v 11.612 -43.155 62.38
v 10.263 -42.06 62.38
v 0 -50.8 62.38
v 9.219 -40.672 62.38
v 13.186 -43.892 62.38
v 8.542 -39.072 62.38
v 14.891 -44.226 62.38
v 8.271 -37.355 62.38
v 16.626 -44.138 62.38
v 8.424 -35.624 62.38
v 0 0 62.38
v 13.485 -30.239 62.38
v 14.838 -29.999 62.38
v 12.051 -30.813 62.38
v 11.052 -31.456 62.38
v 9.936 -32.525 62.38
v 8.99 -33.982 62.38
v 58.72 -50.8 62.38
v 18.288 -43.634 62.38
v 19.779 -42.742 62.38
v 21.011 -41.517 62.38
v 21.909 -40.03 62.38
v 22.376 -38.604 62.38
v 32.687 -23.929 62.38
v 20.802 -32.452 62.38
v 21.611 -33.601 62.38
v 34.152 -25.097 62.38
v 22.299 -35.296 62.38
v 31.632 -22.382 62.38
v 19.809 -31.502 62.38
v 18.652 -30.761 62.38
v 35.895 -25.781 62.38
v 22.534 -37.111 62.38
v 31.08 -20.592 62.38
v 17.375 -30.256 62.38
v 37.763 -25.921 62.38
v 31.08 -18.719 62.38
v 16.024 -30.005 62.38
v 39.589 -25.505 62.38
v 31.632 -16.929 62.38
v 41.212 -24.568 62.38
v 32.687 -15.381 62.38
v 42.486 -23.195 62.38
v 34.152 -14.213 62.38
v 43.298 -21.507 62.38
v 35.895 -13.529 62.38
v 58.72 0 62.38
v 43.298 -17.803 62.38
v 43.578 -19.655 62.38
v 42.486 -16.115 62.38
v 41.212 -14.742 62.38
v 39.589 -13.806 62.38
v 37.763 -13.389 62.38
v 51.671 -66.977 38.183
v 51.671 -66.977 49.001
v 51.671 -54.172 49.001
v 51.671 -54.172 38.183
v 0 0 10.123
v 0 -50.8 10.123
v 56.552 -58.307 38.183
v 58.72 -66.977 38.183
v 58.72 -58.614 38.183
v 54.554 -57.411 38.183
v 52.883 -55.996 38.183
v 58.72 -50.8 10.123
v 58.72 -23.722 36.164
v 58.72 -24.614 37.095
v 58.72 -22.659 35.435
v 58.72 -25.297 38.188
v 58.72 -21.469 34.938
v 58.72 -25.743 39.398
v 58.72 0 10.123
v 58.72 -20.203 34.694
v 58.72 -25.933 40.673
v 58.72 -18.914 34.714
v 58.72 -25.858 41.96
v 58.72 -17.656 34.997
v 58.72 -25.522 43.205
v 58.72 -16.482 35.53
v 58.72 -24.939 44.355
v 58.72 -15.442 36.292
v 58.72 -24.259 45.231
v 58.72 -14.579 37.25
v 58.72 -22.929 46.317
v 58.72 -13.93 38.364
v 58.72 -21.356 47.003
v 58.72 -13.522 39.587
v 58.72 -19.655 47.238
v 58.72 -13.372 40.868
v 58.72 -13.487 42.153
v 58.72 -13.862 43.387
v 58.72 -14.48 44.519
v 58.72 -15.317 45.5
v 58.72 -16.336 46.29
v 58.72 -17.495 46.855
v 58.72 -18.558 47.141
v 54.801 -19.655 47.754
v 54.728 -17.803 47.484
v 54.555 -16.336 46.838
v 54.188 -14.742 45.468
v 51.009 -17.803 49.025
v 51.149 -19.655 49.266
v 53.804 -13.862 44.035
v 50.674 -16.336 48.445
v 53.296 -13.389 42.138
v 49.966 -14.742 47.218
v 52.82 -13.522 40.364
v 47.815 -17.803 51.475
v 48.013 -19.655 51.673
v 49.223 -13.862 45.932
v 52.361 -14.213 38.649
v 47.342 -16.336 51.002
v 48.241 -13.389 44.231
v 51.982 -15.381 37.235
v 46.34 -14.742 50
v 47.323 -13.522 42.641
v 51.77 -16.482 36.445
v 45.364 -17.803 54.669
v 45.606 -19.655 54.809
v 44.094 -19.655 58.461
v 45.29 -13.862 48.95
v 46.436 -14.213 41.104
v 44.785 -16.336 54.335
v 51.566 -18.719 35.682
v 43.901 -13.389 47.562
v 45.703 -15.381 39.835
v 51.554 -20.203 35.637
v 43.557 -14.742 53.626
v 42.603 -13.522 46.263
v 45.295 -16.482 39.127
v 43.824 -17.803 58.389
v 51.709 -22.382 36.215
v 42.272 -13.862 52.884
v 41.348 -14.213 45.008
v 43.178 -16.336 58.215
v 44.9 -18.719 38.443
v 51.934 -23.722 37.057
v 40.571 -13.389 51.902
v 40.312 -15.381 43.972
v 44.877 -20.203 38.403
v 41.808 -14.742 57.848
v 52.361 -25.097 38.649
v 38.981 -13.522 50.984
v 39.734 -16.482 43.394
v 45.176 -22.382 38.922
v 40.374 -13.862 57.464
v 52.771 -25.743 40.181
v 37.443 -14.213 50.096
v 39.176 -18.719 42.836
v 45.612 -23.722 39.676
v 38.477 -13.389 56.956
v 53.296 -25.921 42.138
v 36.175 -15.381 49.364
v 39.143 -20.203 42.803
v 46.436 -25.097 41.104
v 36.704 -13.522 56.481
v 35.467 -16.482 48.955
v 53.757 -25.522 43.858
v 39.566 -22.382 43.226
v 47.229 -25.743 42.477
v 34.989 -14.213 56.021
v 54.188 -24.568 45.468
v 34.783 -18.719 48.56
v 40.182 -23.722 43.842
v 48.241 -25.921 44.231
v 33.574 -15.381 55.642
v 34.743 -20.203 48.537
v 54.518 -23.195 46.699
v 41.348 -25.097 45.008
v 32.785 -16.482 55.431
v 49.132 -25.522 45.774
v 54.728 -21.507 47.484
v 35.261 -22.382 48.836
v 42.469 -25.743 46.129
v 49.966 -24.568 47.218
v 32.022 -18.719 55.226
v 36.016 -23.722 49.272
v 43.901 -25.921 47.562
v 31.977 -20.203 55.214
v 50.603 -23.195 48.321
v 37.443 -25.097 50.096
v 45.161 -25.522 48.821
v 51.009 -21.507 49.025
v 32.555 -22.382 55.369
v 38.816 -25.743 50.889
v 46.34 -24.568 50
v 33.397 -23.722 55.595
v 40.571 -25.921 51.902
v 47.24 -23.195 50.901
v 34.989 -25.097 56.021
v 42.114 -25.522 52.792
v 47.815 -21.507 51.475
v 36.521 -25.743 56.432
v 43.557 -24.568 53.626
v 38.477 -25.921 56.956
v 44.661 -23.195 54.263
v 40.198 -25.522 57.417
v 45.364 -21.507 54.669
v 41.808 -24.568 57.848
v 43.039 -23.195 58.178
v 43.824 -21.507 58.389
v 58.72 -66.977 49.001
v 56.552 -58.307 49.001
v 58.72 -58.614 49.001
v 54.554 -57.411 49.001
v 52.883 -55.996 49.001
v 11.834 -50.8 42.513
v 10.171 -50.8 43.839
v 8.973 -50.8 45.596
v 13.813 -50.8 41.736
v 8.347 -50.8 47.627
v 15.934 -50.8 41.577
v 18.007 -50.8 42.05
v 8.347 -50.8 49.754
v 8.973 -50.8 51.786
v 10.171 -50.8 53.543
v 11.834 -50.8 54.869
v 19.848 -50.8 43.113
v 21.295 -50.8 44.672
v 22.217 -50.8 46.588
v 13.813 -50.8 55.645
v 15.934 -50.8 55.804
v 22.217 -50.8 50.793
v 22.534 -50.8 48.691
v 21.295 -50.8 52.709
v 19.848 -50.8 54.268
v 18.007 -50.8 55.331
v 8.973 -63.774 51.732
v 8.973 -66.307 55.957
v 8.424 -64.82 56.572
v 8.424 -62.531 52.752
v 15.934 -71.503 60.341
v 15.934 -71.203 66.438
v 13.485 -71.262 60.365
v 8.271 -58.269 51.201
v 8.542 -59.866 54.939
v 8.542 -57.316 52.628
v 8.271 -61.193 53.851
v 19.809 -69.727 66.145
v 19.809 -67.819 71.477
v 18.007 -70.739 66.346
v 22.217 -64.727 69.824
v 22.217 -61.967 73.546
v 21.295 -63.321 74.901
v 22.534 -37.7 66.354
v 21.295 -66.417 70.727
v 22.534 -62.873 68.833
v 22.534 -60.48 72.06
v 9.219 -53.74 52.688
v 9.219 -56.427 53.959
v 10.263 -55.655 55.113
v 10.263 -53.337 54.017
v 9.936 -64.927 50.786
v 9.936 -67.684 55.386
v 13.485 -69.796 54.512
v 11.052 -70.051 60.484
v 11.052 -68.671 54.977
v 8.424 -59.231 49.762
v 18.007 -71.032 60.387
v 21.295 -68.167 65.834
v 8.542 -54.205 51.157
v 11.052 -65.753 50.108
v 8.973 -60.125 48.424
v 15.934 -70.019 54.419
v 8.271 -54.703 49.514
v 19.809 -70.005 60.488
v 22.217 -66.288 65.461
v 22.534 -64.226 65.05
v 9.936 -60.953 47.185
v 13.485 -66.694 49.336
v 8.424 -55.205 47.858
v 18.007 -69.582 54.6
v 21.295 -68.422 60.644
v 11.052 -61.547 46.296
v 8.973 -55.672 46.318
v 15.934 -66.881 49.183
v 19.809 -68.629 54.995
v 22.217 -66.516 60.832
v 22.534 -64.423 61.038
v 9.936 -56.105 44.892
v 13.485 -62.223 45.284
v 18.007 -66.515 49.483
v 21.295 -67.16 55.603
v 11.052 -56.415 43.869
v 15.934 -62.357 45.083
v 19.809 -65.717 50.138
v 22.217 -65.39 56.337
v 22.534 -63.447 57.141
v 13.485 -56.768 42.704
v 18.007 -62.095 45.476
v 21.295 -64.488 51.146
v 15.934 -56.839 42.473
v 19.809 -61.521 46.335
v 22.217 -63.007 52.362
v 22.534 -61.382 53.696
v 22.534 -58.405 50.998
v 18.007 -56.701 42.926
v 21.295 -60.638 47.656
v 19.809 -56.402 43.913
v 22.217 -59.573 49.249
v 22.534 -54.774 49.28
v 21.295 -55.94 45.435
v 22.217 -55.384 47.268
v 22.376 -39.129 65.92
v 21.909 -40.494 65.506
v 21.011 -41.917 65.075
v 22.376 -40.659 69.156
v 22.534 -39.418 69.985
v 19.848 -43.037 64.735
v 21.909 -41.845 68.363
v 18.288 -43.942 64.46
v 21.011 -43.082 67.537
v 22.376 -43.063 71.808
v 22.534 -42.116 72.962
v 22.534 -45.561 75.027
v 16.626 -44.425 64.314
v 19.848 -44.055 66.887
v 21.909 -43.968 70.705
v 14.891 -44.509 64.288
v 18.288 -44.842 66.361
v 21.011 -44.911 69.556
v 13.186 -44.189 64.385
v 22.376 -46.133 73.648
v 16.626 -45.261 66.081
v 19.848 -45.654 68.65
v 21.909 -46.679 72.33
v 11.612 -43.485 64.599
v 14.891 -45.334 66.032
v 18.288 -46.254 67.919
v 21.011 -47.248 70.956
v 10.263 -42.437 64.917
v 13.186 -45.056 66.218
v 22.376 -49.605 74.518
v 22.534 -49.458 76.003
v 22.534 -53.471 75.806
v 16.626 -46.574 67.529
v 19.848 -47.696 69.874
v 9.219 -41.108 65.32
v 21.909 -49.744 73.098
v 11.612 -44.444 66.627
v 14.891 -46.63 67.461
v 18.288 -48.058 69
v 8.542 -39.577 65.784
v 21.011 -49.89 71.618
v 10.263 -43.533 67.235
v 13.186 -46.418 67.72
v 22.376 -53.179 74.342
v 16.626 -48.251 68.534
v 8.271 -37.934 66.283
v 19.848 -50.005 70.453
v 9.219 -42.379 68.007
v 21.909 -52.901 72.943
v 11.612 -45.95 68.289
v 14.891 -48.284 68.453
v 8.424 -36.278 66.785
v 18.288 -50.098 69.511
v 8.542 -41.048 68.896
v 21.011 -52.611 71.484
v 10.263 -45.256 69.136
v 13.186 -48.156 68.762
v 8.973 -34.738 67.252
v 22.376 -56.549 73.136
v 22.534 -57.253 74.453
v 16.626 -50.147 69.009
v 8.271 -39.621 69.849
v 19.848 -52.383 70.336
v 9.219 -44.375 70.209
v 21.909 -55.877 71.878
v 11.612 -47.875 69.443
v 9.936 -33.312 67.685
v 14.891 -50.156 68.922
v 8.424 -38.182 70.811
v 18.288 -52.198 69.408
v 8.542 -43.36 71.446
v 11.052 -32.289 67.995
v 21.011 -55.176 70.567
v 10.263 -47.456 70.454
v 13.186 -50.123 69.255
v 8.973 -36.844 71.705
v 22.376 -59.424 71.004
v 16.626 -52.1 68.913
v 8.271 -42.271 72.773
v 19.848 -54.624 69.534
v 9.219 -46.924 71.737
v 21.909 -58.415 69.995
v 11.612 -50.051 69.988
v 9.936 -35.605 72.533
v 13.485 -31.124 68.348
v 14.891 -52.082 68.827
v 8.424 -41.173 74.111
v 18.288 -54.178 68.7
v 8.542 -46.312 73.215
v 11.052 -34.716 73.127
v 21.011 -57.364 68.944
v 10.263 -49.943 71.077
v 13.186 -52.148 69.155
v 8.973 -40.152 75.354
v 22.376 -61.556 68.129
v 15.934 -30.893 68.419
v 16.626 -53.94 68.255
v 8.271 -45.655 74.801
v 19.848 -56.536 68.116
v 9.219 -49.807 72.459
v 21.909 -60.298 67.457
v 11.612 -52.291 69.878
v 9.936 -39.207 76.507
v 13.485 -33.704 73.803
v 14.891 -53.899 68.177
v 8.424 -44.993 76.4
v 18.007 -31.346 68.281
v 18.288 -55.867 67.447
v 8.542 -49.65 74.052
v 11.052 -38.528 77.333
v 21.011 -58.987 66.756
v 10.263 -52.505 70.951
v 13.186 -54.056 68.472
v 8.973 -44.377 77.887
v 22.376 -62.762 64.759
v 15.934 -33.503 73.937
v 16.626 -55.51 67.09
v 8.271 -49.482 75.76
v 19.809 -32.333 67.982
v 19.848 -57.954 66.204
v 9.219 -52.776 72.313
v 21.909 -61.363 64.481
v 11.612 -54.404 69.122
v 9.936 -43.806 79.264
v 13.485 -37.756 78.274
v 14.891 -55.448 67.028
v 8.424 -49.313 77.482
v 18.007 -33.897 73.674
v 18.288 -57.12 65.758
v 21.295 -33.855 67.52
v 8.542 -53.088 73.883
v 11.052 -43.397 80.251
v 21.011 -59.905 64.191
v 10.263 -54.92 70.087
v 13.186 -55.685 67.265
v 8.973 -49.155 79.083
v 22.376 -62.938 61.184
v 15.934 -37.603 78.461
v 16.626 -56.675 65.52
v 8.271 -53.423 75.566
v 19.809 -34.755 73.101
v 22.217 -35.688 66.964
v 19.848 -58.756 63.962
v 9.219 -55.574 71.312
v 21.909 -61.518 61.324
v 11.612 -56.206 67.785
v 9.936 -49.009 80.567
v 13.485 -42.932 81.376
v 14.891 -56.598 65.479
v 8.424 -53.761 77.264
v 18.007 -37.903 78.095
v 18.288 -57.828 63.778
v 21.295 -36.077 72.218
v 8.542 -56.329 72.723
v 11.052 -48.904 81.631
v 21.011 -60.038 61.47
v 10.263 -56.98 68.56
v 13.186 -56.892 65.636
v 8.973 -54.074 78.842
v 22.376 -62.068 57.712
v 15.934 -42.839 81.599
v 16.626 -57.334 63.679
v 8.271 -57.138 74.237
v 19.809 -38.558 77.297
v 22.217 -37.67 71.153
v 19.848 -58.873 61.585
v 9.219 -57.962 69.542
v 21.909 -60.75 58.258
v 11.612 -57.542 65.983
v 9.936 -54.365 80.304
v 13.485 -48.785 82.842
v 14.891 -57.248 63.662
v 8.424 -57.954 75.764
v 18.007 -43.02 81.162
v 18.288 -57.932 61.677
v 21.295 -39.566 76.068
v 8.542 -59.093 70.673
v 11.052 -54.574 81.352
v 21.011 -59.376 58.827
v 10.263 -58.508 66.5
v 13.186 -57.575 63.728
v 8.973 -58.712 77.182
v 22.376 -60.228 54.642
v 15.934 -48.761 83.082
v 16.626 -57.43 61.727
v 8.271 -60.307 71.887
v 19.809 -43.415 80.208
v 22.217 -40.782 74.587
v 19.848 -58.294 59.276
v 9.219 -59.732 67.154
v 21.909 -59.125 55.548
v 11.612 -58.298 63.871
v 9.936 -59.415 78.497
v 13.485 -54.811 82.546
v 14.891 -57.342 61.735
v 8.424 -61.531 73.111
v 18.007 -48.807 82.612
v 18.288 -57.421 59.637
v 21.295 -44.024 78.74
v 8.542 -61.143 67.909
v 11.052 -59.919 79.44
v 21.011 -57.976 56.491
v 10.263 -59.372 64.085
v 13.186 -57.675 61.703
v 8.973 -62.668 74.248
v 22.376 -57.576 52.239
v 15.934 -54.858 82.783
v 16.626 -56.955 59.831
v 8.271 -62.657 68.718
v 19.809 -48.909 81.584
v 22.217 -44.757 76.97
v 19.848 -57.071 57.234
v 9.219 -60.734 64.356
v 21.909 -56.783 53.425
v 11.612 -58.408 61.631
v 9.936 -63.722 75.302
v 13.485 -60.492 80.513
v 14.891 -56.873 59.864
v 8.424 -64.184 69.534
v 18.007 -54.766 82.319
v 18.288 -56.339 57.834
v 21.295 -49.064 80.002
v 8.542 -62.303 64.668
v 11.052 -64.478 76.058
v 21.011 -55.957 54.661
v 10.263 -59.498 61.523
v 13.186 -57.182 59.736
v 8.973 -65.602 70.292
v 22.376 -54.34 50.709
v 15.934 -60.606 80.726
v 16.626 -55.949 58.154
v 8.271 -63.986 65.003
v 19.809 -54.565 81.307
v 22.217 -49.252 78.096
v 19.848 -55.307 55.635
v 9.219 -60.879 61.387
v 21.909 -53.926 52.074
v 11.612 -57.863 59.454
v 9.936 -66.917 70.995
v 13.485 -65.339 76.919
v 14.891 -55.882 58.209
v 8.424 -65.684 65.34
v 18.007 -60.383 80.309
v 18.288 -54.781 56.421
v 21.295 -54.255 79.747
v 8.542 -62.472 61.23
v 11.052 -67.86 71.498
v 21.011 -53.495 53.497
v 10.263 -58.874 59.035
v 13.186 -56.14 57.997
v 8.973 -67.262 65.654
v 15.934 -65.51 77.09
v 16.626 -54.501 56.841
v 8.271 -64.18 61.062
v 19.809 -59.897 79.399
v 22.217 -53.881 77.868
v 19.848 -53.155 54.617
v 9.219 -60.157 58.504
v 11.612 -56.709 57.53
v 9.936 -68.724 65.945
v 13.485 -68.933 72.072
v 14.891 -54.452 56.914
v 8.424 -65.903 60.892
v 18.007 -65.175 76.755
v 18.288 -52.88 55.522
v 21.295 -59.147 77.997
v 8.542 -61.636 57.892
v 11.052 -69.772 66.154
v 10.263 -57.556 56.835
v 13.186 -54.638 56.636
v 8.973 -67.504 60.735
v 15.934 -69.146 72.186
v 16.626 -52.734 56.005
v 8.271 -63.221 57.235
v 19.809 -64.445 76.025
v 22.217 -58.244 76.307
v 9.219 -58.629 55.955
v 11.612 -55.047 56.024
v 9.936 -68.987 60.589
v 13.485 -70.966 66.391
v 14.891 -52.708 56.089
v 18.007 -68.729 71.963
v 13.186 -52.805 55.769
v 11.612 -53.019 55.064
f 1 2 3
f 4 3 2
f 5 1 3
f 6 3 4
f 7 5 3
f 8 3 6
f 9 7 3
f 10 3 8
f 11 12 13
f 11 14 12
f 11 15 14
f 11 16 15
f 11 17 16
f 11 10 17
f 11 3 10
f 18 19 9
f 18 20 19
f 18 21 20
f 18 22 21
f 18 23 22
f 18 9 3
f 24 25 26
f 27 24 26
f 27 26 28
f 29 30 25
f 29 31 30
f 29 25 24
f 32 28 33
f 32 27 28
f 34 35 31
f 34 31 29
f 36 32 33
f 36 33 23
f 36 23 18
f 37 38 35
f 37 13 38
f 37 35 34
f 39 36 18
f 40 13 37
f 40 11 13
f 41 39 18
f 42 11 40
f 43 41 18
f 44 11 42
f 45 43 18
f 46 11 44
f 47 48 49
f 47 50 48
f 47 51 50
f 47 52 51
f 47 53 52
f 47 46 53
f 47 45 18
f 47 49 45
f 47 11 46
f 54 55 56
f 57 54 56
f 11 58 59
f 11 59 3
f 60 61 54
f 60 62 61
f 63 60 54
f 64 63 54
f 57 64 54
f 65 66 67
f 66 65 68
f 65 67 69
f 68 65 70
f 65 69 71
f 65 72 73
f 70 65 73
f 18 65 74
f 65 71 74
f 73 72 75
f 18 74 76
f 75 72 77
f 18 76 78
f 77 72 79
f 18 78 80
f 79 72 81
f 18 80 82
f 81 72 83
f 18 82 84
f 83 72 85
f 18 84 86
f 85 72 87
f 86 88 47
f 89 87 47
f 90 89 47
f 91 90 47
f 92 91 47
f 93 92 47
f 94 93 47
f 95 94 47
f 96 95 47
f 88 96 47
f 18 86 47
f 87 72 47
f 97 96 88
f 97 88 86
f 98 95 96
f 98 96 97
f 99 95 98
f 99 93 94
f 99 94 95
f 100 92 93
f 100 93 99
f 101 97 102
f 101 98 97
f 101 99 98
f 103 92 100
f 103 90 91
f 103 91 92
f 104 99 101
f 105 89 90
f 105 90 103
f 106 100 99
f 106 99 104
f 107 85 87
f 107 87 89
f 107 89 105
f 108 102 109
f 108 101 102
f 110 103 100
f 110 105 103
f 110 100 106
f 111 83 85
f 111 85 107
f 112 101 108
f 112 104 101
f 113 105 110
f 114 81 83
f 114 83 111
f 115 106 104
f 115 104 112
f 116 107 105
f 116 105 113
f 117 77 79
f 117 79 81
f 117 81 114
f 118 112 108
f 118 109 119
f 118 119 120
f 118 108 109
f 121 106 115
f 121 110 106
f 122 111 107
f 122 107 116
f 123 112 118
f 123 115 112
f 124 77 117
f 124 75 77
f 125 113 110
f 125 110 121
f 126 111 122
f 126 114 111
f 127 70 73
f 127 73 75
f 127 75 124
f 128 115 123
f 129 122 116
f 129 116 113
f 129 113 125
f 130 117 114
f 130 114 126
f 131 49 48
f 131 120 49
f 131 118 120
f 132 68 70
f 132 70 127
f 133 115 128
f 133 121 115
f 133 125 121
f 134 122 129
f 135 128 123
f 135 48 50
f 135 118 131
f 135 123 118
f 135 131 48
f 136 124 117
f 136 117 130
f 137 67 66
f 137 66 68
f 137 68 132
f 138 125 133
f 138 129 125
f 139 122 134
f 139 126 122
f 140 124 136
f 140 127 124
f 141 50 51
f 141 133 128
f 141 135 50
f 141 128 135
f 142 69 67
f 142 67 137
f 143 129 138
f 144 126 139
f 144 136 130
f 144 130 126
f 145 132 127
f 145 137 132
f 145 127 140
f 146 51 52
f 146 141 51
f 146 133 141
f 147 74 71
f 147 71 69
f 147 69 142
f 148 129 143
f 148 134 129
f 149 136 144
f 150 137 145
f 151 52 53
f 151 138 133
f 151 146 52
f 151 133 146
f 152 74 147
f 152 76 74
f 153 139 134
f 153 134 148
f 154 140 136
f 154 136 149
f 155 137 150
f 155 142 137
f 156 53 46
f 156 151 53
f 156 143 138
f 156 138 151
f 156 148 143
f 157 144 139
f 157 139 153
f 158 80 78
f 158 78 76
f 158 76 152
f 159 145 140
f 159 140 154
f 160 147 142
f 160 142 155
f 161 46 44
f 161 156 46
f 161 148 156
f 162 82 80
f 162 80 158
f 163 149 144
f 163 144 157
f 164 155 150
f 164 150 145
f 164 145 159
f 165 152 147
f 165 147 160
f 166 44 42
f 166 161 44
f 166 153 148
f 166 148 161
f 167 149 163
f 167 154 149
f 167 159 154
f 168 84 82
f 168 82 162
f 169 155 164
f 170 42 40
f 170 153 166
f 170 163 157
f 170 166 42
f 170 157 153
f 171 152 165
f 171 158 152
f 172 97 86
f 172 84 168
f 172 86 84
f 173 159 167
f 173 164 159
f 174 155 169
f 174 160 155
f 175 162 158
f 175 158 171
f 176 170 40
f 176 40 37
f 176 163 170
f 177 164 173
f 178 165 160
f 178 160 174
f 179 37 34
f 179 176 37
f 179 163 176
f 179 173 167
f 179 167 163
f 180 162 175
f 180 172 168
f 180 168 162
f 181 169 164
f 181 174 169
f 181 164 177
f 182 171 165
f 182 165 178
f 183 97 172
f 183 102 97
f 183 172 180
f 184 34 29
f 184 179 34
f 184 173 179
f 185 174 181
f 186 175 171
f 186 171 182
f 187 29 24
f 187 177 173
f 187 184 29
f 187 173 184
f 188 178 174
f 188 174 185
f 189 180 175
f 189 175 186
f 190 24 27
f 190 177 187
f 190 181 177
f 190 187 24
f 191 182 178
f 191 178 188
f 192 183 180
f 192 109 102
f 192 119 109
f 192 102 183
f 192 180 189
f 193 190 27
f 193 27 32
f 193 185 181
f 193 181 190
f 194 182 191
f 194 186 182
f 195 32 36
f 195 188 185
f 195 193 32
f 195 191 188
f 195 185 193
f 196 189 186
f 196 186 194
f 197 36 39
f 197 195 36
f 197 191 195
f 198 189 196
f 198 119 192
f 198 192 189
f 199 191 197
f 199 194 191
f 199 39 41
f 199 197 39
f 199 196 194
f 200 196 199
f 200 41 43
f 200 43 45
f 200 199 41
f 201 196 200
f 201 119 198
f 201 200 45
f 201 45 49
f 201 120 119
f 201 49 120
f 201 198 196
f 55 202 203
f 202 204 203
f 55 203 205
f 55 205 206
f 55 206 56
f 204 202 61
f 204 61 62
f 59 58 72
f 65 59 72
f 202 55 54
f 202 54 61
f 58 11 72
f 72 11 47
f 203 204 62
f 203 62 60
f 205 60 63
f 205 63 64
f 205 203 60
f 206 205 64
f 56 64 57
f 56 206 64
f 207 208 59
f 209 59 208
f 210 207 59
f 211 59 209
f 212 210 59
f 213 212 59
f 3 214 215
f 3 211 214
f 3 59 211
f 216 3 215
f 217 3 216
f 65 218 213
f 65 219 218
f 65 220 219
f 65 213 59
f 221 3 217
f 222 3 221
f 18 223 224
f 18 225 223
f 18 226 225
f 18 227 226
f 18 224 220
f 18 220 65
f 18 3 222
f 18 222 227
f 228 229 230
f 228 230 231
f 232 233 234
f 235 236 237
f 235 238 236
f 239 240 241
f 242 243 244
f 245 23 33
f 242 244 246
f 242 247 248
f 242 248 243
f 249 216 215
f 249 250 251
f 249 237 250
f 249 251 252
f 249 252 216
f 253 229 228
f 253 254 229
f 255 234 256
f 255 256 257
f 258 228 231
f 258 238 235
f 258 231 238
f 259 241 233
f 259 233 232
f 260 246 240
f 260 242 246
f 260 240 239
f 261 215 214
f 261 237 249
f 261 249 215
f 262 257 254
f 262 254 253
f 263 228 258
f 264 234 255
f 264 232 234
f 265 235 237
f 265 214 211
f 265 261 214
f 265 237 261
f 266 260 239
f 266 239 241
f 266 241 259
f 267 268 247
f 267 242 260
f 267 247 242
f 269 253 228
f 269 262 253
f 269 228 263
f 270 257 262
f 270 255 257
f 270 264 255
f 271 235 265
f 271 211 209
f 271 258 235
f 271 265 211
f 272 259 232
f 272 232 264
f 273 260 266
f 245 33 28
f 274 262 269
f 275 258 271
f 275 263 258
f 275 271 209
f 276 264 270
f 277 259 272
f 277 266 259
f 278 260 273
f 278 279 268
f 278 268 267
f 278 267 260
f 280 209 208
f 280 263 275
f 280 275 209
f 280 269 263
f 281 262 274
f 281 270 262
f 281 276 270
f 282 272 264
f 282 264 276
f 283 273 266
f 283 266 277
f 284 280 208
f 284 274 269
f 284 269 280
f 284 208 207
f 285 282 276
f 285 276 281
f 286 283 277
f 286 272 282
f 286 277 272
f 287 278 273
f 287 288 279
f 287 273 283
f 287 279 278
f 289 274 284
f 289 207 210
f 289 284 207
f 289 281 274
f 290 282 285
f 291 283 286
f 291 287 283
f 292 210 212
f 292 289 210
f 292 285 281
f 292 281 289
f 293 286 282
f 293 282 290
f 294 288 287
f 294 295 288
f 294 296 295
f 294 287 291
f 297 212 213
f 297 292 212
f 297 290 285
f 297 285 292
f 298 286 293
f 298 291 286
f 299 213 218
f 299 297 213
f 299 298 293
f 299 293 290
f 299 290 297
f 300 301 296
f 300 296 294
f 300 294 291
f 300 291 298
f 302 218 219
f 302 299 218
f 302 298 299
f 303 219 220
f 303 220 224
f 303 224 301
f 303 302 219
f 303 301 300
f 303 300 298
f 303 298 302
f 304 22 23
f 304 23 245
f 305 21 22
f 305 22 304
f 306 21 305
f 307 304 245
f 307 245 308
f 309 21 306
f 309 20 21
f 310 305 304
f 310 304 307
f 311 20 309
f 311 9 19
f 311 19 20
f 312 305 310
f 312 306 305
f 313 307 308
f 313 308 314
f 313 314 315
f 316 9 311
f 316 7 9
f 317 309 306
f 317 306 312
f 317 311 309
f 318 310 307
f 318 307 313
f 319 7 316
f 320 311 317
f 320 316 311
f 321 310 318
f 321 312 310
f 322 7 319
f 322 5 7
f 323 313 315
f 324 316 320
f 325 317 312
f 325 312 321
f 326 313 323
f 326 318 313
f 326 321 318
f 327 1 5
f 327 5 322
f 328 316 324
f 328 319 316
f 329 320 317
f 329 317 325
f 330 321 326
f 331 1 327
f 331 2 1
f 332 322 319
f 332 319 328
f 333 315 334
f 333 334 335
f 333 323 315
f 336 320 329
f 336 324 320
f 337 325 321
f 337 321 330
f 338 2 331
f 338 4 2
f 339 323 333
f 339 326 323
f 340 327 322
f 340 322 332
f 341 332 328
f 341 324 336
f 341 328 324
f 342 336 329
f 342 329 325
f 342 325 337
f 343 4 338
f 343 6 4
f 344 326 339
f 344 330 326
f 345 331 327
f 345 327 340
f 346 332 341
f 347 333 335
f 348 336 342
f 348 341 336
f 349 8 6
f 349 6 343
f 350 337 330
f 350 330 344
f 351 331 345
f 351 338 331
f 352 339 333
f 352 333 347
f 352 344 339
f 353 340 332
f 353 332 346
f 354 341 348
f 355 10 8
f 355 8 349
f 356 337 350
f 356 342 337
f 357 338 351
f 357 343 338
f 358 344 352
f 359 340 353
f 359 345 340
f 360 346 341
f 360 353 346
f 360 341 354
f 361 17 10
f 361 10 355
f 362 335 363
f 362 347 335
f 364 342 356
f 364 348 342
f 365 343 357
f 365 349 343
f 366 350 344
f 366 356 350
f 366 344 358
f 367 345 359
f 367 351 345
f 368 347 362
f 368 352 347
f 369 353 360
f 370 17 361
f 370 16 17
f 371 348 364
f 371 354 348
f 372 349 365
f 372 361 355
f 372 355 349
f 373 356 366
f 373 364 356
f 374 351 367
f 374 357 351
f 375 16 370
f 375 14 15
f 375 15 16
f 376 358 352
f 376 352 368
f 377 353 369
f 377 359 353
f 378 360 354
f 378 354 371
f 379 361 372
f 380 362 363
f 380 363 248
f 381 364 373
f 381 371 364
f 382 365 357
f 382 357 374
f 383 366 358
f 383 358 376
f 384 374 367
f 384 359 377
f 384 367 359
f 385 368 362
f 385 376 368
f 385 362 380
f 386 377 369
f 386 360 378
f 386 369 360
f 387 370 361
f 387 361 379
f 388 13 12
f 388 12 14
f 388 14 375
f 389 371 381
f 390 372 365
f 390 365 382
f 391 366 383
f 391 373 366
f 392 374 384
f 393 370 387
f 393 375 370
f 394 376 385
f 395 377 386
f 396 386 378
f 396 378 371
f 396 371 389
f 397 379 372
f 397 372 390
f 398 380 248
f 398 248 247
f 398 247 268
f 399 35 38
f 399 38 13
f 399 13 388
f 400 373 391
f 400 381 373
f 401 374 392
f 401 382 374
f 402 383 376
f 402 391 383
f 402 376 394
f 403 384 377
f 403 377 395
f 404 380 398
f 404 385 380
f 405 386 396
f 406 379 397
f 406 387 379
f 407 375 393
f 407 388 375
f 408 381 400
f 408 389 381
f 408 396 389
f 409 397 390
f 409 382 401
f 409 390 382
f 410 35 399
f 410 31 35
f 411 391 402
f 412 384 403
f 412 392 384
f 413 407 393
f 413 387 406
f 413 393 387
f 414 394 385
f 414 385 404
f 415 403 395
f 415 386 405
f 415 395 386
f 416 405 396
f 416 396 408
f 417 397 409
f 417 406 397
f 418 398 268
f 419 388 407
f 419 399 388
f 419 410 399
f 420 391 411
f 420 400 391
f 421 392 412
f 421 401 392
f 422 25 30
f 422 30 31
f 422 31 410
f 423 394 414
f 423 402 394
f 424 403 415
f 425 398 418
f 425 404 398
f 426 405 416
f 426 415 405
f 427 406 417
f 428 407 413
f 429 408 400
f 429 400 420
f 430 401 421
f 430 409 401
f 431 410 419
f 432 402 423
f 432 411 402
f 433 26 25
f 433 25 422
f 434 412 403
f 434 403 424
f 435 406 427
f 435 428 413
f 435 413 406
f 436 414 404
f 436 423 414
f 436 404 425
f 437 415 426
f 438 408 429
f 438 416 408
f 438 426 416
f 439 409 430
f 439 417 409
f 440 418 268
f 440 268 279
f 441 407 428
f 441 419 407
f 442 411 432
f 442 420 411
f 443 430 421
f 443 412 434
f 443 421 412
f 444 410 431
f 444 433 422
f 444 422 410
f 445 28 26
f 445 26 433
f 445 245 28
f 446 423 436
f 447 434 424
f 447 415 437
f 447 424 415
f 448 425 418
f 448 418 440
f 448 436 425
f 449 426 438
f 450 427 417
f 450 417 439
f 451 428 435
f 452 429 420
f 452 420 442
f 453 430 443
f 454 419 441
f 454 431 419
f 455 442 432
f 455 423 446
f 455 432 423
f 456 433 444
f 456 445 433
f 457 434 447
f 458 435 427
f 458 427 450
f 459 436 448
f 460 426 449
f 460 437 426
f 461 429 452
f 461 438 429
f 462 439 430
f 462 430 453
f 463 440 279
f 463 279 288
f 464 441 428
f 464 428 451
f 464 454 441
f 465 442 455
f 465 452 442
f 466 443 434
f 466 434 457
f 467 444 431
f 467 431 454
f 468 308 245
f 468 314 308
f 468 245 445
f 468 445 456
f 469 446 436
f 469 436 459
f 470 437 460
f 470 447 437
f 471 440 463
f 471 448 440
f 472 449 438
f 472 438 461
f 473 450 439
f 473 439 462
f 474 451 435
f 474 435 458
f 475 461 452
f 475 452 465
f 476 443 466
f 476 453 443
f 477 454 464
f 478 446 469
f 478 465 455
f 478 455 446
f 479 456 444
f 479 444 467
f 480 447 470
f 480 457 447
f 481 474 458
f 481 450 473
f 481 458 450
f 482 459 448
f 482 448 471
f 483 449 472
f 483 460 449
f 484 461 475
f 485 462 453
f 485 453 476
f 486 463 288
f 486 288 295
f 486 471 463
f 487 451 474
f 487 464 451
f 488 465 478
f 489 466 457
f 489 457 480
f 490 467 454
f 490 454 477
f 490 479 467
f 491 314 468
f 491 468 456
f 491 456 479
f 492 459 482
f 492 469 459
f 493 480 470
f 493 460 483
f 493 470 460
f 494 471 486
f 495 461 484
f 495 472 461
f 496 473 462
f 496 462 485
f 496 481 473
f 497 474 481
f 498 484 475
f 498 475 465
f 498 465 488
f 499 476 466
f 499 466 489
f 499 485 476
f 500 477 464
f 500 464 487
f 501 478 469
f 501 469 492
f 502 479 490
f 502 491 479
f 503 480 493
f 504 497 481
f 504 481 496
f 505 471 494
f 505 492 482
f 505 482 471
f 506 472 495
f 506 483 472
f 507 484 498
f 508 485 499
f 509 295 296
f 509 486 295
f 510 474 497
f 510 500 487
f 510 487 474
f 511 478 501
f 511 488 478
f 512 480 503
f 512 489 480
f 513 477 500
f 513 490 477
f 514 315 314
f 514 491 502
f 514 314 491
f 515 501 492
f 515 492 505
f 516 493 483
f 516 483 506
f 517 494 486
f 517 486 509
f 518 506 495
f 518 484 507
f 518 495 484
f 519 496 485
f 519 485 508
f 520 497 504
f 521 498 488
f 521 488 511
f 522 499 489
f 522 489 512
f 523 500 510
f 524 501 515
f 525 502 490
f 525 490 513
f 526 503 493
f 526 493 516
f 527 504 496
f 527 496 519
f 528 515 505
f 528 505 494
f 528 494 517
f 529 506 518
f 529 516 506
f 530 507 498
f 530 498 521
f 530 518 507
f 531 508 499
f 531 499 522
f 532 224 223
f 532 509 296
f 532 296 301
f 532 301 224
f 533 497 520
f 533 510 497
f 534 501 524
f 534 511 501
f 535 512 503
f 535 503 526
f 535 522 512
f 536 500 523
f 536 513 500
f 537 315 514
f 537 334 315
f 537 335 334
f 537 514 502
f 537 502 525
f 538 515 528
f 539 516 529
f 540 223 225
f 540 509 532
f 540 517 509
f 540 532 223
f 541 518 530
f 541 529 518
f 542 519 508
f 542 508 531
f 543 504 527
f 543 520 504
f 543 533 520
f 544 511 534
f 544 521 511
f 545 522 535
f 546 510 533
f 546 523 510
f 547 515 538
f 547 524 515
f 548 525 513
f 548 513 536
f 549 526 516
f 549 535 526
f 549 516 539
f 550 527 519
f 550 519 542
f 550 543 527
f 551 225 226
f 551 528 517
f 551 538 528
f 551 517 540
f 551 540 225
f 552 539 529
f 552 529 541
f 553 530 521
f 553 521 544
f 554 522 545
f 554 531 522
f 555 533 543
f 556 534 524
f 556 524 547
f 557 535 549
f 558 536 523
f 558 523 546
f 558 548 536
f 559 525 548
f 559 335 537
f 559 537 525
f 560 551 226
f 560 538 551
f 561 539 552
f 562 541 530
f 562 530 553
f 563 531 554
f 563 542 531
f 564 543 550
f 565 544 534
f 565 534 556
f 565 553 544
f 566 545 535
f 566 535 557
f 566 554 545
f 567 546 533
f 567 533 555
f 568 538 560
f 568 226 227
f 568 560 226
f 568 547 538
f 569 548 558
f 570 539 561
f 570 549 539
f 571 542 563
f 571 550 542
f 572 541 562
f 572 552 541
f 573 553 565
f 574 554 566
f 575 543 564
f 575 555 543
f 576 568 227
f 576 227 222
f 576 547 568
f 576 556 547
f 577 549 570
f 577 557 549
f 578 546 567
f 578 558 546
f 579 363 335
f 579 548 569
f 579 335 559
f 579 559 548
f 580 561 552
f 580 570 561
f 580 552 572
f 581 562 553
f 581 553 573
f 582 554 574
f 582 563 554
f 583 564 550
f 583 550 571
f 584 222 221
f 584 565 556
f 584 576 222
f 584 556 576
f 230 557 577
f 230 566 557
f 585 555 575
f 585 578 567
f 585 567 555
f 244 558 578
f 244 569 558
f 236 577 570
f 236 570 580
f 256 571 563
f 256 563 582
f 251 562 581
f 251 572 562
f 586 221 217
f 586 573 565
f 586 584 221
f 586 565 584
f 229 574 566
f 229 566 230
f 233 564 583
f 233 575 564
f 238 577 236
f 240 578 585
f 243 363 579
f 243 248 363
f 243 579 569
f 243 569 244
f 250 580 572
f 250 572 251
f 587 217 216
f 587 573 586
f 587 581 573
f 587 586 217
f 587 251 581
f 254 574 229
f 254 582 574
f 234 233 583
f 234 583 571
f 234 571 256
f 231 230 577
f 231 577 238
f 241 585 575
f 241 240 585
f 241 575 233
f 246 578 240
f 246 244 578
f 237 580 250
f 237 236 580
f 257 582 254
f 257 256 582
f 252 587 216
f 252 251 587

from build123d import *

# Parameters (mm, degrees)
F0_W      = 58.7195754051
F0_H      = 52.2568076849
F1_DEPTH  = 50.8
F2_R      = 7.1335833388
F4_W      = 9.8321177065
F4_H      = 10.8174271882
F6_R      = 6.2838171935
F9_W      = 7.0489501051
F9_H      = 16.1772435407
F10_DEPTH = 12.7


with BuildPart() as f1:
    # F0 (on Front) → F1 (new body)
    with BuildSketch(Plane.XZ):
        with Locations((29.3597877026, 36.2514294684)):
            Rectangle(F0_W, F0_H)
    extrude(amount=F1_DEPTH)

    # F2 (on face) → F3 (revolve)
    with BuildSketch(Plane.XZ.offset(50.8)):
        with Locations((15.4005596414, 48.6906468868)):
            Circle(F2_R)
    revolve(axis=Axis((29.3597877026, -50.8, 62.3798333108), (1, 0, 0)))


with BuildPart() as f5:
    # F4 (on face) → F5 (revolve)
    with BuildSketch(Plane.XZ.offset(50.8)):
        with Locations((45.989362523, 43.5920413584)):
            Rectangle(F4_W, F4_H)
    revolve(axis=Axis((58.7195754051, -50.8, 36.2514294684), (0, 0, -1)))


with BuildPart() as f7:
    # F6 (on face) → F7 (revolve)
    with BuildSketch(Plane.XY.offset(62.3798333108)):
        with Locations((37.2937507927, -19.6551214904)):
            Circle(F6_R)
    revolve(axis=Axis((58.7195754051, -25.4, 62.3798333108), (0, 1, 0)))


with BuildPart() as f1_1:
    add(f1.part)

    # F8: cut F7
    add(f7.part, mode=Mode.SUBTRACT)


with BuildPart() as f10:
    # F9 (on face) → F10 (new body, symmetric)
    with BuildSketch(Plane.XY.offset(49.0007549524)):
        with Locations((55.1951003526, -58.8886217704)):
            Rectangle(F9_W, F9_H)
    extrude(amount=F10_DEPTH, both=True)

    # F11: intersect F5
    add(f5.part, mode=Mode.INTERSECT)


solid = Compound([f1_1.part, f10.part])
